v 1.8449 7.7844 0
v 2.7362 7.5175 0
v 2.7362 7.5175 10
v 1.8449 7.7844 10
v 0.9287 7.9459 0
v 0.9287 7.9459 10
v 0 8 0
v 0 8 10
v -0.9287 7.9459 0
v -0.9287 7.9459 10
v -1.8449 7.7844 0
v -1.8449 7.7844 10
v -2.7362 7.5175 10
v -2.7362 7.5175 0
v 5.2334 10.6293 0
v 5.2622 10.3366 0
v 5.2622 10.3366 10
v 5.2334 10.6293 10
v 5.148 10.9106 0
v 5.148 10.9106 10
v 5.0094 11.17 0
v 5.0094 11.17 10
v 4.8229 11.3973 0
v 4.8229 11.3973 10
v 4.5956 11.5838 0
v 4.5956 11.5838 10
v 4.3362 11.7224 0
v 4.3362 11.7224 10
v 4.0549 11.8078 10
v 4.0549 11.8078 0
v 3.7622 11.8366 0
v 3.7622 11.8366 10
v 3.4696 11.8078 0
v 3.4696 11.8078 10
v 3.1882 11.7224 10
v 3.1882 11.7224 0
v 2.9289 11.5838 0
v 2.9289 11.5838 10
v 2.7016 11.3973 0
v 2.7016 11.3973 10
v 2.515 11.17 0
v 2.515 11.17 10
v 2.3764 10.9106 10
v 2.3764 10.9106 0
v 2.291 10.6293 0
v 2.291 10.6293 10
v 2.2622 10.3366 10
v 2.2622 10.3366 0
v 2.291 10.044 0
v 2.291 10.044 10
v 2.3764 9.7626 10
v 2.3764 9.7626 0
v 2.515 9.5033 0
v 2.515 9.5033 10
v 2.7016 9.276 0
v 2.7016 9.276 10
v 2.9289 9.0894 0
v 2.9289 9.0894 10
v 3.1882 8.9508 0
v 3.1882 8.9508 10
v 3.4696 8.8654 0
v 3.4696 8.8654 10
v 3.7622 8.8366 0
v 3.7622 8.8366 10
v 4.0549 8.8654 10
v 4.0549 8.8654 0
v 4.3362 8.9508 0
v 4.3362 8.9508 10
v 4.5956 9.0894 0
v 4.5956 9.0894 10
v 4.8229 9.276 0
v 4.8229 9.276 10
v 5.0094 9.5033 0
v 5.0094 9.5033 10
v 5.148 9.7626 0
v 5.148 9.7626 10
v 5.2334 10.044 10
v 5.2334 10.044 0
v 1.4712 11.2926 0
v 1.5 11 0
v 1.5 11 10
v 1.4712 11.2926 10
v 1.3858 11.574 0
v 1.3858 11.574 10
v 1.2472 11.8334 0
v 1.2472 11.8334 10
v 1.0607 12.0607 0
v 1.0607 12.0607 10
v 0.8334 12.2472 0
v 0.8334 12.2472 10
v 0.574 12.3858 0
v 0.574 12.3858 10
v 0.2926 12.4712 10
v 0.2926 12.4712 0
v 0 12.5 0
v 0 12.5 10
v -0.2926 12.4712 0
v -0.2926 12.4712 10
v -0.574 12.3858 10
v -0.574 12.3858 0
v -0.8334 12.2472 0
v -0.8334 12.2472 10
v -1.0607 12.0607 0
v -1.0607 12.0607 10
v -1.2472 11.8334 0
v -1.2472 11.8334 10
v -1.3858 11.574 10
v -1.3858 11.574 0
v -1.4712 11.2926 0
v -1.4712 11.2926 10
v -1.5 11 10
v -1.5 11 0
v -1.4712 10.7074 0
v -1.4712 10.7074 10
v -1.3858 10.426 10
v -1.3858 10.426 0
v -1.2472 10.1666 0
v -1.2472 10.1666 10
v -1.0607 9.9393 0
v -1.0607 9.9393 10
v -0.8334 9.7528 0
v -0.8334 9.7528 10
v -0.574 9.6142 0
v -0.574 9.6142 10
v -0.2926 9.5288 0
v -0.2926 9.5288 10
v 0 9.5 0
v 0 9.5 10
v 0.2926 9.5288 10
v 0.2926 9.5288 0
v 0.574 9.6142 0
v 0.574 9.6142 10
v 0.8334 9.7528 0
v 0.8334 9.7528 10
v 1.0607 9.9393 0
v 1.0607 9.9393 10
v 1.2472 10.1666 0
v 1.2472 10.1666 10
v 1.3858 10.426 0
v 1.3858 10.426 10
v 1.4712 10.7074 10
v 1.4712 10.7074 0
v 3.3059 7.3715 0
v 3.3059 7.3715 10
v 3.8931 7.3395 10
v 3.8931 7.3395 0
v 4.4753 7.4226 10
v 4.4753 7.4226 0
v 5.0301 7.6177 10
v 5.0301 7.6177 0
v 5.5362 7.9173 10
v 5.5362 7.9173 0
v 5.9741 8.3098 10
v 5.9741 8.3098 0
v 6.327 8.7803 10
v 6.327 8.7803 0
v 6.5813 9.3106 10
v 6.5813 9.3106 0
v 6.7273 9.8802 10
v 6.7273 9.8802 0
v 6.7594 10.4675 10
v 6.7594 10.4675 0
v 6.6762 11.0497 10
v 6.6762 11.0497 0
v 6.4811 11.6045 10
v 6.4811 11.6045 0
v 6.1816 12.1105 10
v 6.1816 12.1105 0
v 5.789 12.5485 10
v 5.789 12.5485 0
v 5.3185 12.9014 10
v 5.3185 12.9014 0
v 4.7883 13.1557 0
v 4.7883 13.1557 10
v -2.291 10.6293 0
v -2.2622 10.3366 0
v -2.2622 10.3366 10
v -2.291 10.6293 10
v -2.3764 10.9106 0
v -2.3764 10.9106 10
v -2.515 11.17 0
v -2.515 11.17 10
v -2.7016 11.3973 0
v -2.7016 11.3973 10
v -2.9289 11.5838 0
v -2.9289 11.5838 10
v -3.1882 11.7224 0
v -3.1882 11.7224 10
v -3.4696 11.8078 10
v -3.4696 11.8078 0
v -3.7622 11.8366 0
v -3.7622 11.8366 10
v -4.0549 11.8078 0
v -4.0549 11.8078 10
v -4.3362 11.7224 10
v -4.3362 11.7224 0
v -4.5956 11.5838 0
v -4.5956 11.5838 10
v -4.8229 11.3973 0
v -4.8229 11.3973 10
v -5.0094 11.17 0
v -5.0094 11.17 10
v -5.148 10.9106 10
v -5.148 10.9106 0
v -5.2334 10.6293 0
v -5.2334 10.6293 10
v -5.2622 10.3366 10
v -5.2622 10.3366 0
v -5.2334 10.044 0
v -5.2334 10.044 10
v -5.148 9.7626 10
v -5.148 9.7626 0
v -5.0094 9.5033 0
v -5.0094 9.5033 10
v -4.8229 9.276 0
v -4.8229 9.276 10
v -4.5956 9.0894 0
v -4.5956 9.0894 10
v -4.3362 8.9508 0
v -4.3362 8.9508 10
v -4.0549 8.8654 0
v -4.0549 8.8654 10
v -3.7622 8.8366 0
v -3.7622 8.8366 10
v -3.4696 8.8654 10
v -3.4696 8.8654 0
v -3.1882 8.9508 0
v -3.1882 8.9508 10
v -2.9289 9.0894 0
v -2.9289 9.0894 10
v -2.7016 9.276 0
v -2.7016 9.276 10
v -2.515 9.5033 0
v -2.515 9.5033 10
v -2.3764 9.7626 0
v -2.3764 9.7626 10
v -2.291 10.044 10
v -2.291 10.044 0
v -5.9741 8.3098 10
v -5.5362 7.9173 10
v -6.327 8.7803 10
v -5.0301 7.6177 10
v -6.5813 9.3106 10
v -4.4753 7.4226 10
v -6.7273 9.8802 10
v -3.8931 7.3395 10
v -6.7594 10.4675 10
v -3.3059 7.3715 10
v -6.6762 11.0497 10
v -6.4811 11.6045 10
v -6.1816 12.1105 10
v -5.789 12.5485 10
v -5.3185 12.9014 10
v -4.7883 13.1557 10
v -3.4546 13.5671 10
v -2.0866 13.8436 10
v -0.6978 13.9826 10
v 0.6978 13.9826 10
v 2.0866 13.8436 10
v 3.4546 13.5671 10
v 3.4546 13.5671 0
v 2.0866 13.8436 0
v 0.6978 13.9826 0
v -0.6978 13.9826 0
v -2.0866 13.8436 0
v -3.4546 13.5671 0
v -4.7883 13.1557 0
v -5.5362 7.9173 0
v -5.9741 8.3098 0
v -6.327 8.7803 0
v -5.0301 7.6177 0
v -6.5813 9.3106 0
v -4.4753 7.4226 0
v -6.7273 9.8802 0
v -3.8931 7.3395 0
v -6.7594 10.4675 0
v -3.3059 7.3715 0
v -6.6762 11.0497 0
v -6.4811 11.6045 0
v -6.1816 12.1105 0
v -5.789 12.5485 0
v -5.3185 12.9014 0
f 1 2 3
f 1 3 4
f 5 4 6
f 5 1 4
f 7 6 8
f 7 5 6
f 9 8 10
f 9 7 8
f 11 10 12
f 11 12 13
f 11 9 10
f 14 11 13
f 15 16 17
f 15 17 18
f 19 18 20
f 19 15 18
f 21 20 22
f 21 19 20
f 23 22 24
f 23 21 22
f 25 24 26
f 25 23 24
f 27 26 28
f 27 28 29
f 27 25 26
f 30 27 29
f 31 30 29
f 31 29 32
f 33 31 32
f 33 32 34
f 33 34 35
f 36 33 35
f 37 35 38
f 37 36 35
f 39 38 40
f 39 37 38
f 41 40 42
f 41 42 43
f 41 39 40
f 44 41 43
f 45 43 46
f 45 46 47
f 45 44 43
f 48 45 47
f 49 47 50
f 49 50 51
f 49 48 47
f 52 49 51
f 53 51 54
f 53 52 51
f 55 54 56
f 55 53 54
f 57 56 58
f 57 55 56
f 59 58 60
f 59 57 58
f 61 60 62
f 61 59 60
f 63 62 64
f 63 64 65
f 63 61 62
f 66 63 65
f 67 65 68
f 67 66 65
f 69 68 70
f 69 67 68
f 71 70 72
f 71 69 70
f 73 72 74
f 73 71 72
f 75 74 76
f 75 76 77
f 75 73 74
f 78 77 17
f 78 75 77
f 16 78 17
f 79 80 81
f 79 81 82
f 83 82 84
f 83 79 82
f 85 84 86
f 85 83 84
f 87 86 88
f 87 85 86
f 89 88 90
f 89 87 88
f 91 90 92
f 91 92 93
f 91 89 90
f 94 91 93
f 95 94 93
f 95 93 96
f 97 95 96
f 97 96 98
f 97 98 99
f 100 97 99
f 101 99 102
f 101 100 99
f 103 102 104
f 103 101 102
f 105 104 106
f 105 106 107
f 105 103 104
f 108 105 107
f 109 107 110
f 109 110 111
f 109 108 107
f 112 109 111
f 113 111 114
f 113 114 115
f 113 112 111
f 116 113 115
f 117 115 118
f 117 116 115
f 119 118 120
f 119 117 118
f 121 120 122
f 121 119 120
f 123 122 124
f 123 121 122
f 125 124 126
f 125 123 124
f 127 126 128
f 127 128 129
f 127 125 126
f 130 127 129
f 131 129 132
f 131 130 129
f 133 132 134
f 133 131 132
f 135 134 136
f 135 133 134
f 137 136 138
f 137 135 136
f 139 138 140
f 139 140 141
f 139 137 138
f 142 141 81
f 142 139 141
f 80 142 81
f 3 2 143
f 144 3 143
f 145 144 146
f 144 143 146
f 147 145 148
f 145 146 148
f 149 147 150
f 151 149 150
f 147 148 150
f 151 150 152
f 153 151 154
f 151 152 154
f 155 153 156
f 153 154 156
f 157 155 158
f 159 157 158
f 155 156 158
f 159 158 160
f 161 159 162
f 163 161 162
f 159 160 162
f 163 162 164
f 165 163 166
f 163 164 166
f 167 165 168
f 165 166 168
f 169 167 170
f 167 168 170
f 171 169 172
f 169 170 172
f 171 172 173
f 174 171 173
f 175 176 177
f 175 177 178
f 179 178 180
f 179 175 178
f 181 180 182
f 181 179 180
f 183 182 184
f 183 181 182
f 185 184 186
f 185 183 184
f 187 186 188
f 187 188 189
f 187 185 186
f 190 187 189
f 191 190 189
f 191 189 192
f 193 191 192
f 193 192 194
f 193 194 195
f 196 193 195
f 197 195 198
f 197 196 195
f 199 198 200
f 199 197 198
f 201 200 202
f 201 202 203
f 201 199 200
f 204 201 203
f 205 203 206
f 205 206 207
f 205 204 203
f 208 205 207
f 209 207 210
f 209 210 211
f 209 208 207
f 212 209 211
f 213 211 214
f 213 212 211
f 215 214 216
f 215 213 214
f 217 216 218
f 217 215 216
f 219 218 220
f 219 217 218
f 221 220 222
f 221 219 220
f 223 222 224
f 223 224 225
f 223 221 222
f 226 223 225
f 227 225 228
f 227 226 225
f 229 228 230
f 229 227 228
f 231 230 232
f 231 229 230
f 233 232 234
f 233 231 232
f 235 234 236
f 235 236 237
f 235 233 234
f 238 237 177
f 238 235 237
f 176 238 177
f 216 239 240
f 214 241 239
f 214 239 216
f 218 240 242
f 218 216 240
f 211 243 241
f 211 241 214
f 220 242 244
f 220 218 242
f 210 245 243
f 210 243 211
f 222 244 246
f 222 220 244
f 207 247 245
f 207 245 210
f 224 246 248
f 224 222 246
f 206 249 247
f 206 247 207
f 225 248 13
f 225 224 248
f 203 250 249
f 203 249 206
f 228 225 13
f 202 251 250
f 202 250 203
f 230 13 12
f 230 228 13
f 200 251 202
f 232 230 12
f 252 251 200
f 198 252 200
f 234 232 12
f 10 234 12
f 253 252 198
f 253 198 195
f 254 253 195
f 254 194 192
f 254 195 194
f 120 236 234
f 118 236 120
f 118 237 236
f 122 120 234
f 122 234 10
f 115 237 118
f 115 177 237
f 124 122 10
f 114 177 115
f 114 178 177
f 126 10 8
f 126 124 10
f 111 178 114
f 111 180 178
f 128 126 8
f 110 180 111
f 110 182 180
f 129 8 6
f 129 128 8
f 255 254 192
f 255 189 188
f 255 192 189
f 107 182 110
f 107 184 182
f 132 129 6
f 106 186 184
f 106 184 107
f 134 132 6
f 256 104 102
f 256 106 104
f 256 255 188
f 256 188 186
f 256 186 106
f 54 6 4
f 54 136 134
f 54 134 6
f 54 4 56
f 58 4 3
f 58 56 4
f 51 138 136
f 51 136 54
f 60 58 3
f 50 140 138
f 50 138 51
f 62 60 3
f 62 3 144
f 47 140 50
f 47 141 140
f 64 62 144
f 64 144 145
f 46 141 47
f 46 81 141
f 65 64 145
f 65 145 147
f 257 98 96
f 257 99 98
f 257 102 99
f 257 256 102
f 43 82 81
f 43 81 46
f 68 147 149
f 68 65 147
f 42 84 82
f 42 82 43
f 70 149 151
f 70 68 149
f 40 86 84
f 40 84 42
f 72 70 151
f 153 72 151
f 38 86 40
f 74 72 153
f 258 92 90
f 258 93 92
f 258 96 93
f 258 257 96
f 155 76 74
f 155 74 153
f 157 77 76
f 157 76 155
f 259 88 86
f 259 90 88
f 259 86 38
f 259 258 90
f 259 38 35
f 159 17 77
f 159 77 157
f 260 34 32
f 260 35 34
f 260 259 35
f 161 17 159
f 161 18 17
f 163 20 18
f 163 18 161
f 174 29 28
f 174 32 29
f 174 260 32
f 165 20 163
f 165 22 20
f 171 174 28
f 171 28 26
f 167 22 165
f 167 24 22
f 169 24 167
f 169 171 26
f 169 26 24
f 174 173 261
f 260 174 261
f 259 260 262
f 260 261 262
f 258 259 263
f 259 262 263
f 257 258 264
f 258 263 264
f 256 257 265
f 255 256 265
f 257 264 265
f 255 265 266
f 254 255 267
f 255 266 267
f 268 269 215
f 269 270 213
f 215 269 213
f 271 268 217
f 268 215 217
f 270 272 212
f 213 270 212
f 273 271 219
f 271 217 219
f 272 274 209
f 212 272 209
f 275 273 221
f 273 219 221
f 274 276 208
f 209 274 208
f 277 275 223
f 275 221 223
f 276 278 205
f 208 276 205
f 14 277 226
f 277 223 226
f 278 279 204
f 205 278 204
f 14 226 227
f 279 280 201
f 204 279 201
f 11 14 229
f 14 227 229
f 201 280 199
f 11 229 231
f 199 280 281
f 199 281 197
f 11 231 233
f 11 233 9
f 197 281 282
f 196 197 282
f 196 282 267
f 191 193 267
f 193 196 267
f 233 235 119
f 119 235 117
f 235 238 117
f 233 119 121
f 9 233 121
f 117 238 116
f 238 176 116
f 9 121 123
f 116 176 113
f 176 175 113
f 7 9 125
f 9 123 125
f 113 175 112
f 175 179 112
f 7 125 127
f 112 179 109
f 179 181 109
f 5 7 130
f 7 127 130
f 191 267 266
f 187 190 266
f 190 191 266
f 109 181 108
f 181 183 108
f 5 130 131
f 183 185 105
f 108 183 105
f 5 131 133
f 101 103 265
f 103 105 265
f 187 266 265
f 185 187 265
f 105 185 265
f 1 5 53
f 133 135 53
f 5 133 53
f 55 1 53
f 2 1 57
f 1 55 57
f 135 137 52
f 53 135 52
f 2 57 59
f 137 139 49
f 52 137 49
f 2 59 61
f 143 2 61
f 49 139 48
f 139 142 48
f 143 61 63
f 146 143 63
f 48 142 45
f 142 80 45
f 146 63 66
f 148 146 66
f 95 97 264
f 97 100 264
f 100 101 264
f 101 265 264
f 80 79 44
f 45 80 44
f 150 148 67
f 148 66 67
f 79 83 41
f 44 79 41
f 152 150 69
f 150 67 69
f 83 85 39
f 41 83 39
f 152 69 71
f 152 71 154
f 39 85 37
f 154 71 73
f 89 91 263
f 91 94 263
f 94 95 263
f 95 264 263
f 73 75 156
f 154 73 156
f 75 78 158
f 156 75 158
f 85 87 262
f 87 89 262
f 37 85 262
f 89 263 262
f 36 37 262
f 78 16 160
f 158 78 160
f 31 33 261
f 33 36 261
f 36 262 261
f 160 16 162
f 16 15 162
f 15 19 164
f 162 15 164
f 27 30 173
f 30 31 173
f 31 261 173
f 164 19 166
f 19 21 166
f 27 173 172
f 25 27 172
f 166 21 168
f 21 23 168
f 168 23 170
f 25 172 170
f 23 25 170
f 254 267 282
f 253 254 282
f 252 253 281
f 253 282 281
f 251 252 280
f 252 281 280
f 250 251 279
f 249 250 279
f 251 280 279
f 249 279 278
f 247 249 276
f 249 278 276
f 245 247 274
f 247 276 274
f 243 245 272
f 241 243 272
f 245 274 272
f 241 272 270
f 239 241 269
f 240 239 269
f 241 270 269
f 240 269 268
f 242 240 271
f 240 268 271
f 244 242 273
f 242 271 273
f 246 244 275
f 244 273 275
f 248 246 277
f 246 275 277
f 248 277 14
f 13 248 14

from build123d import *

# Parameters (mm, degrees)
SKETCH_R  = 1.5
PAD_DEPTH = 10


with BuildPart() as part:
    # Sketch → Pad (new body)
    with BuildSketch(Plane.XY):
        with BuildLine():
            ThreePointArc((-4.788282, 13.155697), (-6.581299, 9.310558), (-2.736161, 7.517541))
            ThreePointArc((2.736161, 7.517541), (0, 8), (-2.736161, 7.517541))
            ThreePointArc((2.736161, 7.517541), (6.581299, 9.310558), (4.788282, 13.155697))
            ThreePointArc((4.788282, 13.155697), (0, 14), (-4.788282, 13.155697))
        make_face()
        with Locations((-3.762222, 10.336619)):
            Circle(SKETCH_R, mode=Mode.SUBTRACT)
        with Locations((3.762222, 10.336619)):
            Circle(SKETCH_R, mode=Mode.SUBTRACT)
        with Locations((0, 11)):
            Circle(SKETCH_R, mode=Mode.SUBTRACT)
    extrude(amount=PAD_DEPTH)


solid = part.part
